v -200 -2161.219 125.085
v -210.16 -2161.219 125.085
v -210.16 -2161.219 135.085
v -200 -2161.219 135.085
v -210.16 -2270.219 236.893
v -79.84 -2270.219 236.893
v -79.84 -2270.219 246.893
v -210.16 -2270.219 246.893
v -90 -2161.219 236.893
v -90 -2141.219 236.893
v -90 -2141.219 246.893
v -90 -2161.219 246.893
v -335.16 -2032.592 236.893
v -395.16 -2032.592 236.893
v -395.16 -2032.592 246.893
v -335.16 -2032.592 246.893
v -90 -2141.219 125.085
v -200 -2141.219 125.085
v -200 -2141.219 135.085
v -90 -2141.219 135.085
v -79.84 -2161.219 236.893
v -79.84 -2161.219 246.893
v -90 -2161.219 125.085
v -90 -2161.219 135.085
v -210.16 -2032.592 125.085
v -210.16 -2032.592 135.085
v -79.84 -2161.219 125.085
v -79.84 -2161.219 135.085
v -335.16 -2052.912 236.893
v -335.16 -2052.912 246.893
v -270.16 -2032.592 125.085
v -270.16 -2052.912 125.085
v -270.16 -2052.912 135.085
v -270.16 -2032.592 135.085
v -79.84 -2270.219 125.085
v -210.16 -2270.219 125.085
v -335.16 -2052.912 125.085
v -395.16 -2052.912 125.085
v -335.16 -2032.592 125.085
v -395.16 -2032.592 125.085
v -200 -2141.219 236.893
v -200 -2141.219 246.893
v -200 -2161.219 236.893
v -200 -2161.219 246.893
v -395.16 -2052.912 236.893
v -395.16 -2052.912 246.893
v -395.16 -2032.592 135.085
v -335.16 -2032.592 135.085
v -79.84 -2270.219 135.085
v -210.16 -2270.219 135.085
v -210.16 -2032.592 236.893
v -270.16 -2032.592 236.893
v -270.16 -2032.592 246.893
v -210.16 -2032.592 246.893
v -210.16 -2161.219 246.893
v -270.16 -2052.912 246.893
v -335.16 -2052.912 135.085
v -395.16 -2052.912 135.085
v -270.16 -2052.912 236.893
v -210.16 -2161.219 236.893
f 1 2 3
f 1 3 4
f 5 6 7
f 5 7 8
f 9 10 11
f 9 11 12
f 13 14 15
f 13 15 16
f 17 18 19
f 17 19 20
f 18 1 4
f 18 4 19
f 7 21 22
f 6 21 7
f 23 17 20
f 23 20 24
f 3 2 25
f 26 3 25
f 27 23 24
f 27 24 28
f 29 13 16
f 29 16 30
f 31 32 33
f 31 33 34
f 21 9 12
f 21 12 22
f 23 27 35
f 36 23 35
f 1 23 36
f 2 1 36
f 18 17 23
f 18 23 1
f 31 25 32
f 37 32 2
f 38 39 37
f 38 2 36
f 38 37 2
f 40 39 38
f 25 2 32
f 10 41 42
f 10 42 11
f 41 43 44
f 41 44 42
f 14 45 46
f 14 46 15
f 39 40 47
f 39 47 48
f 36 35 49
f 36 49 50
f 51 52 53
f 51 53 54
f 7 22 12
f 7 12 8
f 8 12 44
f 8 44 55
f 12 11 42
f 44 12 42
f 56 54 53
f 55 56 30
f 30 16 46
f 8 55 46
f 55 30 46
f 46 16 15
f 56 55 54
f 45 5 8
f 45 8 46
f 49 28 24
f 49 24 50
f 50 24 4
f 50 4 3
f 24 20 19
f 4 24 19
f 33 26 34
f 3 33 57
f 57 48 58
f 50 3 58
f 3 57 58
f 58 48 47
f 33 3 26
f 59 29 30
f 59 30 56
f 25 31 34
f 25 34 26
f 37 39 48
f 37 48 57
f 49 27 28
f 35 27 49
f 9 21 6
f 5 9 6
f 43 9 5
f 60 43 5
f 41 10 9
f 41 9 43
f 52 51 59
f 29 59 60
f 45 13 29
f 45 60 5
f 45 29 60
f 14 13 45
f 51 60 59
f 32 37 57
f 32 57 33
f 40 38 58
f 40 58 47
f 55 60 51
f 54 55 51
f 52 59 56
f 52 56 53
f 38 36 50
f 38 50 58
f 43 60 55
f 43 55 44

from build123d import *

# Parameters (mm, degrees)
BOSS_EXTRUDE1_START = 236.892664
BOSS_EXTRUDE1_DEPTH = 10
BOSS_EXTRUDE2_START = 125.085498
BOSS_EXTRUDE2_DEPTH = 10


with BuildPart() as part:
    # Sketch1 → Boss-Extrude1 (new body)
    with BuildSketch(Plane.XY.offset(BOSS_EXTRUDE1_START)):
        Polygon((-210.16, -2161.218921834), (-200, -2161.218921834), (-200, -2141.218921834), (-90, -2141.218921834), (-90, -2161.218921834), (-79.84, -2161.218921834), (-79.84, -2270.218921834), (-210.16, -2270.218921834), (-395.16, -2052.911580455), (-395.16, -2032.591580455), (-335.16, -2032.591580455), (-335.16, -2052.911580455), (-270.16, -2052.911580455), (-270.16, -2032.591580455), (-210.16, -2032.591580455), (-210.16, -2052.911580455), align=None)
    extrude(amount=BOSS_EXTRUDE1_DEPTH)


with BuildPart() as body_2:
    # Sketch1<2> → Boss-Extrude2 (new body)
    with BuildSketch(Plane.XY.offset(BOSS_EXTRUDE2_START)):
        Polygon((-210.16, -2161.218921834), (-200, -2161.218921834), (-200, -2141.218921834), (-90, -2141.218921834), (-90, -2161.218921834), (-79.84, -2161.218921834), (-79.84, -2270.218921834), (-210.16, -2270.218921834), (-395.16, -2052.911580455), (-395.16, -2032.591580455), (-335.16, -2032.591580455), (-335.16, -2052.911580455), (-270.16, -2052.911580455), (-270.16, -2032.591580455), (-210.16, -2032.591580455), (-210.16, -2052.911580455), align=None)
    extrude(amount=BOSS_EXTRUDE2_DEPTH)


solid = Compound([part.part, body_2.part])
